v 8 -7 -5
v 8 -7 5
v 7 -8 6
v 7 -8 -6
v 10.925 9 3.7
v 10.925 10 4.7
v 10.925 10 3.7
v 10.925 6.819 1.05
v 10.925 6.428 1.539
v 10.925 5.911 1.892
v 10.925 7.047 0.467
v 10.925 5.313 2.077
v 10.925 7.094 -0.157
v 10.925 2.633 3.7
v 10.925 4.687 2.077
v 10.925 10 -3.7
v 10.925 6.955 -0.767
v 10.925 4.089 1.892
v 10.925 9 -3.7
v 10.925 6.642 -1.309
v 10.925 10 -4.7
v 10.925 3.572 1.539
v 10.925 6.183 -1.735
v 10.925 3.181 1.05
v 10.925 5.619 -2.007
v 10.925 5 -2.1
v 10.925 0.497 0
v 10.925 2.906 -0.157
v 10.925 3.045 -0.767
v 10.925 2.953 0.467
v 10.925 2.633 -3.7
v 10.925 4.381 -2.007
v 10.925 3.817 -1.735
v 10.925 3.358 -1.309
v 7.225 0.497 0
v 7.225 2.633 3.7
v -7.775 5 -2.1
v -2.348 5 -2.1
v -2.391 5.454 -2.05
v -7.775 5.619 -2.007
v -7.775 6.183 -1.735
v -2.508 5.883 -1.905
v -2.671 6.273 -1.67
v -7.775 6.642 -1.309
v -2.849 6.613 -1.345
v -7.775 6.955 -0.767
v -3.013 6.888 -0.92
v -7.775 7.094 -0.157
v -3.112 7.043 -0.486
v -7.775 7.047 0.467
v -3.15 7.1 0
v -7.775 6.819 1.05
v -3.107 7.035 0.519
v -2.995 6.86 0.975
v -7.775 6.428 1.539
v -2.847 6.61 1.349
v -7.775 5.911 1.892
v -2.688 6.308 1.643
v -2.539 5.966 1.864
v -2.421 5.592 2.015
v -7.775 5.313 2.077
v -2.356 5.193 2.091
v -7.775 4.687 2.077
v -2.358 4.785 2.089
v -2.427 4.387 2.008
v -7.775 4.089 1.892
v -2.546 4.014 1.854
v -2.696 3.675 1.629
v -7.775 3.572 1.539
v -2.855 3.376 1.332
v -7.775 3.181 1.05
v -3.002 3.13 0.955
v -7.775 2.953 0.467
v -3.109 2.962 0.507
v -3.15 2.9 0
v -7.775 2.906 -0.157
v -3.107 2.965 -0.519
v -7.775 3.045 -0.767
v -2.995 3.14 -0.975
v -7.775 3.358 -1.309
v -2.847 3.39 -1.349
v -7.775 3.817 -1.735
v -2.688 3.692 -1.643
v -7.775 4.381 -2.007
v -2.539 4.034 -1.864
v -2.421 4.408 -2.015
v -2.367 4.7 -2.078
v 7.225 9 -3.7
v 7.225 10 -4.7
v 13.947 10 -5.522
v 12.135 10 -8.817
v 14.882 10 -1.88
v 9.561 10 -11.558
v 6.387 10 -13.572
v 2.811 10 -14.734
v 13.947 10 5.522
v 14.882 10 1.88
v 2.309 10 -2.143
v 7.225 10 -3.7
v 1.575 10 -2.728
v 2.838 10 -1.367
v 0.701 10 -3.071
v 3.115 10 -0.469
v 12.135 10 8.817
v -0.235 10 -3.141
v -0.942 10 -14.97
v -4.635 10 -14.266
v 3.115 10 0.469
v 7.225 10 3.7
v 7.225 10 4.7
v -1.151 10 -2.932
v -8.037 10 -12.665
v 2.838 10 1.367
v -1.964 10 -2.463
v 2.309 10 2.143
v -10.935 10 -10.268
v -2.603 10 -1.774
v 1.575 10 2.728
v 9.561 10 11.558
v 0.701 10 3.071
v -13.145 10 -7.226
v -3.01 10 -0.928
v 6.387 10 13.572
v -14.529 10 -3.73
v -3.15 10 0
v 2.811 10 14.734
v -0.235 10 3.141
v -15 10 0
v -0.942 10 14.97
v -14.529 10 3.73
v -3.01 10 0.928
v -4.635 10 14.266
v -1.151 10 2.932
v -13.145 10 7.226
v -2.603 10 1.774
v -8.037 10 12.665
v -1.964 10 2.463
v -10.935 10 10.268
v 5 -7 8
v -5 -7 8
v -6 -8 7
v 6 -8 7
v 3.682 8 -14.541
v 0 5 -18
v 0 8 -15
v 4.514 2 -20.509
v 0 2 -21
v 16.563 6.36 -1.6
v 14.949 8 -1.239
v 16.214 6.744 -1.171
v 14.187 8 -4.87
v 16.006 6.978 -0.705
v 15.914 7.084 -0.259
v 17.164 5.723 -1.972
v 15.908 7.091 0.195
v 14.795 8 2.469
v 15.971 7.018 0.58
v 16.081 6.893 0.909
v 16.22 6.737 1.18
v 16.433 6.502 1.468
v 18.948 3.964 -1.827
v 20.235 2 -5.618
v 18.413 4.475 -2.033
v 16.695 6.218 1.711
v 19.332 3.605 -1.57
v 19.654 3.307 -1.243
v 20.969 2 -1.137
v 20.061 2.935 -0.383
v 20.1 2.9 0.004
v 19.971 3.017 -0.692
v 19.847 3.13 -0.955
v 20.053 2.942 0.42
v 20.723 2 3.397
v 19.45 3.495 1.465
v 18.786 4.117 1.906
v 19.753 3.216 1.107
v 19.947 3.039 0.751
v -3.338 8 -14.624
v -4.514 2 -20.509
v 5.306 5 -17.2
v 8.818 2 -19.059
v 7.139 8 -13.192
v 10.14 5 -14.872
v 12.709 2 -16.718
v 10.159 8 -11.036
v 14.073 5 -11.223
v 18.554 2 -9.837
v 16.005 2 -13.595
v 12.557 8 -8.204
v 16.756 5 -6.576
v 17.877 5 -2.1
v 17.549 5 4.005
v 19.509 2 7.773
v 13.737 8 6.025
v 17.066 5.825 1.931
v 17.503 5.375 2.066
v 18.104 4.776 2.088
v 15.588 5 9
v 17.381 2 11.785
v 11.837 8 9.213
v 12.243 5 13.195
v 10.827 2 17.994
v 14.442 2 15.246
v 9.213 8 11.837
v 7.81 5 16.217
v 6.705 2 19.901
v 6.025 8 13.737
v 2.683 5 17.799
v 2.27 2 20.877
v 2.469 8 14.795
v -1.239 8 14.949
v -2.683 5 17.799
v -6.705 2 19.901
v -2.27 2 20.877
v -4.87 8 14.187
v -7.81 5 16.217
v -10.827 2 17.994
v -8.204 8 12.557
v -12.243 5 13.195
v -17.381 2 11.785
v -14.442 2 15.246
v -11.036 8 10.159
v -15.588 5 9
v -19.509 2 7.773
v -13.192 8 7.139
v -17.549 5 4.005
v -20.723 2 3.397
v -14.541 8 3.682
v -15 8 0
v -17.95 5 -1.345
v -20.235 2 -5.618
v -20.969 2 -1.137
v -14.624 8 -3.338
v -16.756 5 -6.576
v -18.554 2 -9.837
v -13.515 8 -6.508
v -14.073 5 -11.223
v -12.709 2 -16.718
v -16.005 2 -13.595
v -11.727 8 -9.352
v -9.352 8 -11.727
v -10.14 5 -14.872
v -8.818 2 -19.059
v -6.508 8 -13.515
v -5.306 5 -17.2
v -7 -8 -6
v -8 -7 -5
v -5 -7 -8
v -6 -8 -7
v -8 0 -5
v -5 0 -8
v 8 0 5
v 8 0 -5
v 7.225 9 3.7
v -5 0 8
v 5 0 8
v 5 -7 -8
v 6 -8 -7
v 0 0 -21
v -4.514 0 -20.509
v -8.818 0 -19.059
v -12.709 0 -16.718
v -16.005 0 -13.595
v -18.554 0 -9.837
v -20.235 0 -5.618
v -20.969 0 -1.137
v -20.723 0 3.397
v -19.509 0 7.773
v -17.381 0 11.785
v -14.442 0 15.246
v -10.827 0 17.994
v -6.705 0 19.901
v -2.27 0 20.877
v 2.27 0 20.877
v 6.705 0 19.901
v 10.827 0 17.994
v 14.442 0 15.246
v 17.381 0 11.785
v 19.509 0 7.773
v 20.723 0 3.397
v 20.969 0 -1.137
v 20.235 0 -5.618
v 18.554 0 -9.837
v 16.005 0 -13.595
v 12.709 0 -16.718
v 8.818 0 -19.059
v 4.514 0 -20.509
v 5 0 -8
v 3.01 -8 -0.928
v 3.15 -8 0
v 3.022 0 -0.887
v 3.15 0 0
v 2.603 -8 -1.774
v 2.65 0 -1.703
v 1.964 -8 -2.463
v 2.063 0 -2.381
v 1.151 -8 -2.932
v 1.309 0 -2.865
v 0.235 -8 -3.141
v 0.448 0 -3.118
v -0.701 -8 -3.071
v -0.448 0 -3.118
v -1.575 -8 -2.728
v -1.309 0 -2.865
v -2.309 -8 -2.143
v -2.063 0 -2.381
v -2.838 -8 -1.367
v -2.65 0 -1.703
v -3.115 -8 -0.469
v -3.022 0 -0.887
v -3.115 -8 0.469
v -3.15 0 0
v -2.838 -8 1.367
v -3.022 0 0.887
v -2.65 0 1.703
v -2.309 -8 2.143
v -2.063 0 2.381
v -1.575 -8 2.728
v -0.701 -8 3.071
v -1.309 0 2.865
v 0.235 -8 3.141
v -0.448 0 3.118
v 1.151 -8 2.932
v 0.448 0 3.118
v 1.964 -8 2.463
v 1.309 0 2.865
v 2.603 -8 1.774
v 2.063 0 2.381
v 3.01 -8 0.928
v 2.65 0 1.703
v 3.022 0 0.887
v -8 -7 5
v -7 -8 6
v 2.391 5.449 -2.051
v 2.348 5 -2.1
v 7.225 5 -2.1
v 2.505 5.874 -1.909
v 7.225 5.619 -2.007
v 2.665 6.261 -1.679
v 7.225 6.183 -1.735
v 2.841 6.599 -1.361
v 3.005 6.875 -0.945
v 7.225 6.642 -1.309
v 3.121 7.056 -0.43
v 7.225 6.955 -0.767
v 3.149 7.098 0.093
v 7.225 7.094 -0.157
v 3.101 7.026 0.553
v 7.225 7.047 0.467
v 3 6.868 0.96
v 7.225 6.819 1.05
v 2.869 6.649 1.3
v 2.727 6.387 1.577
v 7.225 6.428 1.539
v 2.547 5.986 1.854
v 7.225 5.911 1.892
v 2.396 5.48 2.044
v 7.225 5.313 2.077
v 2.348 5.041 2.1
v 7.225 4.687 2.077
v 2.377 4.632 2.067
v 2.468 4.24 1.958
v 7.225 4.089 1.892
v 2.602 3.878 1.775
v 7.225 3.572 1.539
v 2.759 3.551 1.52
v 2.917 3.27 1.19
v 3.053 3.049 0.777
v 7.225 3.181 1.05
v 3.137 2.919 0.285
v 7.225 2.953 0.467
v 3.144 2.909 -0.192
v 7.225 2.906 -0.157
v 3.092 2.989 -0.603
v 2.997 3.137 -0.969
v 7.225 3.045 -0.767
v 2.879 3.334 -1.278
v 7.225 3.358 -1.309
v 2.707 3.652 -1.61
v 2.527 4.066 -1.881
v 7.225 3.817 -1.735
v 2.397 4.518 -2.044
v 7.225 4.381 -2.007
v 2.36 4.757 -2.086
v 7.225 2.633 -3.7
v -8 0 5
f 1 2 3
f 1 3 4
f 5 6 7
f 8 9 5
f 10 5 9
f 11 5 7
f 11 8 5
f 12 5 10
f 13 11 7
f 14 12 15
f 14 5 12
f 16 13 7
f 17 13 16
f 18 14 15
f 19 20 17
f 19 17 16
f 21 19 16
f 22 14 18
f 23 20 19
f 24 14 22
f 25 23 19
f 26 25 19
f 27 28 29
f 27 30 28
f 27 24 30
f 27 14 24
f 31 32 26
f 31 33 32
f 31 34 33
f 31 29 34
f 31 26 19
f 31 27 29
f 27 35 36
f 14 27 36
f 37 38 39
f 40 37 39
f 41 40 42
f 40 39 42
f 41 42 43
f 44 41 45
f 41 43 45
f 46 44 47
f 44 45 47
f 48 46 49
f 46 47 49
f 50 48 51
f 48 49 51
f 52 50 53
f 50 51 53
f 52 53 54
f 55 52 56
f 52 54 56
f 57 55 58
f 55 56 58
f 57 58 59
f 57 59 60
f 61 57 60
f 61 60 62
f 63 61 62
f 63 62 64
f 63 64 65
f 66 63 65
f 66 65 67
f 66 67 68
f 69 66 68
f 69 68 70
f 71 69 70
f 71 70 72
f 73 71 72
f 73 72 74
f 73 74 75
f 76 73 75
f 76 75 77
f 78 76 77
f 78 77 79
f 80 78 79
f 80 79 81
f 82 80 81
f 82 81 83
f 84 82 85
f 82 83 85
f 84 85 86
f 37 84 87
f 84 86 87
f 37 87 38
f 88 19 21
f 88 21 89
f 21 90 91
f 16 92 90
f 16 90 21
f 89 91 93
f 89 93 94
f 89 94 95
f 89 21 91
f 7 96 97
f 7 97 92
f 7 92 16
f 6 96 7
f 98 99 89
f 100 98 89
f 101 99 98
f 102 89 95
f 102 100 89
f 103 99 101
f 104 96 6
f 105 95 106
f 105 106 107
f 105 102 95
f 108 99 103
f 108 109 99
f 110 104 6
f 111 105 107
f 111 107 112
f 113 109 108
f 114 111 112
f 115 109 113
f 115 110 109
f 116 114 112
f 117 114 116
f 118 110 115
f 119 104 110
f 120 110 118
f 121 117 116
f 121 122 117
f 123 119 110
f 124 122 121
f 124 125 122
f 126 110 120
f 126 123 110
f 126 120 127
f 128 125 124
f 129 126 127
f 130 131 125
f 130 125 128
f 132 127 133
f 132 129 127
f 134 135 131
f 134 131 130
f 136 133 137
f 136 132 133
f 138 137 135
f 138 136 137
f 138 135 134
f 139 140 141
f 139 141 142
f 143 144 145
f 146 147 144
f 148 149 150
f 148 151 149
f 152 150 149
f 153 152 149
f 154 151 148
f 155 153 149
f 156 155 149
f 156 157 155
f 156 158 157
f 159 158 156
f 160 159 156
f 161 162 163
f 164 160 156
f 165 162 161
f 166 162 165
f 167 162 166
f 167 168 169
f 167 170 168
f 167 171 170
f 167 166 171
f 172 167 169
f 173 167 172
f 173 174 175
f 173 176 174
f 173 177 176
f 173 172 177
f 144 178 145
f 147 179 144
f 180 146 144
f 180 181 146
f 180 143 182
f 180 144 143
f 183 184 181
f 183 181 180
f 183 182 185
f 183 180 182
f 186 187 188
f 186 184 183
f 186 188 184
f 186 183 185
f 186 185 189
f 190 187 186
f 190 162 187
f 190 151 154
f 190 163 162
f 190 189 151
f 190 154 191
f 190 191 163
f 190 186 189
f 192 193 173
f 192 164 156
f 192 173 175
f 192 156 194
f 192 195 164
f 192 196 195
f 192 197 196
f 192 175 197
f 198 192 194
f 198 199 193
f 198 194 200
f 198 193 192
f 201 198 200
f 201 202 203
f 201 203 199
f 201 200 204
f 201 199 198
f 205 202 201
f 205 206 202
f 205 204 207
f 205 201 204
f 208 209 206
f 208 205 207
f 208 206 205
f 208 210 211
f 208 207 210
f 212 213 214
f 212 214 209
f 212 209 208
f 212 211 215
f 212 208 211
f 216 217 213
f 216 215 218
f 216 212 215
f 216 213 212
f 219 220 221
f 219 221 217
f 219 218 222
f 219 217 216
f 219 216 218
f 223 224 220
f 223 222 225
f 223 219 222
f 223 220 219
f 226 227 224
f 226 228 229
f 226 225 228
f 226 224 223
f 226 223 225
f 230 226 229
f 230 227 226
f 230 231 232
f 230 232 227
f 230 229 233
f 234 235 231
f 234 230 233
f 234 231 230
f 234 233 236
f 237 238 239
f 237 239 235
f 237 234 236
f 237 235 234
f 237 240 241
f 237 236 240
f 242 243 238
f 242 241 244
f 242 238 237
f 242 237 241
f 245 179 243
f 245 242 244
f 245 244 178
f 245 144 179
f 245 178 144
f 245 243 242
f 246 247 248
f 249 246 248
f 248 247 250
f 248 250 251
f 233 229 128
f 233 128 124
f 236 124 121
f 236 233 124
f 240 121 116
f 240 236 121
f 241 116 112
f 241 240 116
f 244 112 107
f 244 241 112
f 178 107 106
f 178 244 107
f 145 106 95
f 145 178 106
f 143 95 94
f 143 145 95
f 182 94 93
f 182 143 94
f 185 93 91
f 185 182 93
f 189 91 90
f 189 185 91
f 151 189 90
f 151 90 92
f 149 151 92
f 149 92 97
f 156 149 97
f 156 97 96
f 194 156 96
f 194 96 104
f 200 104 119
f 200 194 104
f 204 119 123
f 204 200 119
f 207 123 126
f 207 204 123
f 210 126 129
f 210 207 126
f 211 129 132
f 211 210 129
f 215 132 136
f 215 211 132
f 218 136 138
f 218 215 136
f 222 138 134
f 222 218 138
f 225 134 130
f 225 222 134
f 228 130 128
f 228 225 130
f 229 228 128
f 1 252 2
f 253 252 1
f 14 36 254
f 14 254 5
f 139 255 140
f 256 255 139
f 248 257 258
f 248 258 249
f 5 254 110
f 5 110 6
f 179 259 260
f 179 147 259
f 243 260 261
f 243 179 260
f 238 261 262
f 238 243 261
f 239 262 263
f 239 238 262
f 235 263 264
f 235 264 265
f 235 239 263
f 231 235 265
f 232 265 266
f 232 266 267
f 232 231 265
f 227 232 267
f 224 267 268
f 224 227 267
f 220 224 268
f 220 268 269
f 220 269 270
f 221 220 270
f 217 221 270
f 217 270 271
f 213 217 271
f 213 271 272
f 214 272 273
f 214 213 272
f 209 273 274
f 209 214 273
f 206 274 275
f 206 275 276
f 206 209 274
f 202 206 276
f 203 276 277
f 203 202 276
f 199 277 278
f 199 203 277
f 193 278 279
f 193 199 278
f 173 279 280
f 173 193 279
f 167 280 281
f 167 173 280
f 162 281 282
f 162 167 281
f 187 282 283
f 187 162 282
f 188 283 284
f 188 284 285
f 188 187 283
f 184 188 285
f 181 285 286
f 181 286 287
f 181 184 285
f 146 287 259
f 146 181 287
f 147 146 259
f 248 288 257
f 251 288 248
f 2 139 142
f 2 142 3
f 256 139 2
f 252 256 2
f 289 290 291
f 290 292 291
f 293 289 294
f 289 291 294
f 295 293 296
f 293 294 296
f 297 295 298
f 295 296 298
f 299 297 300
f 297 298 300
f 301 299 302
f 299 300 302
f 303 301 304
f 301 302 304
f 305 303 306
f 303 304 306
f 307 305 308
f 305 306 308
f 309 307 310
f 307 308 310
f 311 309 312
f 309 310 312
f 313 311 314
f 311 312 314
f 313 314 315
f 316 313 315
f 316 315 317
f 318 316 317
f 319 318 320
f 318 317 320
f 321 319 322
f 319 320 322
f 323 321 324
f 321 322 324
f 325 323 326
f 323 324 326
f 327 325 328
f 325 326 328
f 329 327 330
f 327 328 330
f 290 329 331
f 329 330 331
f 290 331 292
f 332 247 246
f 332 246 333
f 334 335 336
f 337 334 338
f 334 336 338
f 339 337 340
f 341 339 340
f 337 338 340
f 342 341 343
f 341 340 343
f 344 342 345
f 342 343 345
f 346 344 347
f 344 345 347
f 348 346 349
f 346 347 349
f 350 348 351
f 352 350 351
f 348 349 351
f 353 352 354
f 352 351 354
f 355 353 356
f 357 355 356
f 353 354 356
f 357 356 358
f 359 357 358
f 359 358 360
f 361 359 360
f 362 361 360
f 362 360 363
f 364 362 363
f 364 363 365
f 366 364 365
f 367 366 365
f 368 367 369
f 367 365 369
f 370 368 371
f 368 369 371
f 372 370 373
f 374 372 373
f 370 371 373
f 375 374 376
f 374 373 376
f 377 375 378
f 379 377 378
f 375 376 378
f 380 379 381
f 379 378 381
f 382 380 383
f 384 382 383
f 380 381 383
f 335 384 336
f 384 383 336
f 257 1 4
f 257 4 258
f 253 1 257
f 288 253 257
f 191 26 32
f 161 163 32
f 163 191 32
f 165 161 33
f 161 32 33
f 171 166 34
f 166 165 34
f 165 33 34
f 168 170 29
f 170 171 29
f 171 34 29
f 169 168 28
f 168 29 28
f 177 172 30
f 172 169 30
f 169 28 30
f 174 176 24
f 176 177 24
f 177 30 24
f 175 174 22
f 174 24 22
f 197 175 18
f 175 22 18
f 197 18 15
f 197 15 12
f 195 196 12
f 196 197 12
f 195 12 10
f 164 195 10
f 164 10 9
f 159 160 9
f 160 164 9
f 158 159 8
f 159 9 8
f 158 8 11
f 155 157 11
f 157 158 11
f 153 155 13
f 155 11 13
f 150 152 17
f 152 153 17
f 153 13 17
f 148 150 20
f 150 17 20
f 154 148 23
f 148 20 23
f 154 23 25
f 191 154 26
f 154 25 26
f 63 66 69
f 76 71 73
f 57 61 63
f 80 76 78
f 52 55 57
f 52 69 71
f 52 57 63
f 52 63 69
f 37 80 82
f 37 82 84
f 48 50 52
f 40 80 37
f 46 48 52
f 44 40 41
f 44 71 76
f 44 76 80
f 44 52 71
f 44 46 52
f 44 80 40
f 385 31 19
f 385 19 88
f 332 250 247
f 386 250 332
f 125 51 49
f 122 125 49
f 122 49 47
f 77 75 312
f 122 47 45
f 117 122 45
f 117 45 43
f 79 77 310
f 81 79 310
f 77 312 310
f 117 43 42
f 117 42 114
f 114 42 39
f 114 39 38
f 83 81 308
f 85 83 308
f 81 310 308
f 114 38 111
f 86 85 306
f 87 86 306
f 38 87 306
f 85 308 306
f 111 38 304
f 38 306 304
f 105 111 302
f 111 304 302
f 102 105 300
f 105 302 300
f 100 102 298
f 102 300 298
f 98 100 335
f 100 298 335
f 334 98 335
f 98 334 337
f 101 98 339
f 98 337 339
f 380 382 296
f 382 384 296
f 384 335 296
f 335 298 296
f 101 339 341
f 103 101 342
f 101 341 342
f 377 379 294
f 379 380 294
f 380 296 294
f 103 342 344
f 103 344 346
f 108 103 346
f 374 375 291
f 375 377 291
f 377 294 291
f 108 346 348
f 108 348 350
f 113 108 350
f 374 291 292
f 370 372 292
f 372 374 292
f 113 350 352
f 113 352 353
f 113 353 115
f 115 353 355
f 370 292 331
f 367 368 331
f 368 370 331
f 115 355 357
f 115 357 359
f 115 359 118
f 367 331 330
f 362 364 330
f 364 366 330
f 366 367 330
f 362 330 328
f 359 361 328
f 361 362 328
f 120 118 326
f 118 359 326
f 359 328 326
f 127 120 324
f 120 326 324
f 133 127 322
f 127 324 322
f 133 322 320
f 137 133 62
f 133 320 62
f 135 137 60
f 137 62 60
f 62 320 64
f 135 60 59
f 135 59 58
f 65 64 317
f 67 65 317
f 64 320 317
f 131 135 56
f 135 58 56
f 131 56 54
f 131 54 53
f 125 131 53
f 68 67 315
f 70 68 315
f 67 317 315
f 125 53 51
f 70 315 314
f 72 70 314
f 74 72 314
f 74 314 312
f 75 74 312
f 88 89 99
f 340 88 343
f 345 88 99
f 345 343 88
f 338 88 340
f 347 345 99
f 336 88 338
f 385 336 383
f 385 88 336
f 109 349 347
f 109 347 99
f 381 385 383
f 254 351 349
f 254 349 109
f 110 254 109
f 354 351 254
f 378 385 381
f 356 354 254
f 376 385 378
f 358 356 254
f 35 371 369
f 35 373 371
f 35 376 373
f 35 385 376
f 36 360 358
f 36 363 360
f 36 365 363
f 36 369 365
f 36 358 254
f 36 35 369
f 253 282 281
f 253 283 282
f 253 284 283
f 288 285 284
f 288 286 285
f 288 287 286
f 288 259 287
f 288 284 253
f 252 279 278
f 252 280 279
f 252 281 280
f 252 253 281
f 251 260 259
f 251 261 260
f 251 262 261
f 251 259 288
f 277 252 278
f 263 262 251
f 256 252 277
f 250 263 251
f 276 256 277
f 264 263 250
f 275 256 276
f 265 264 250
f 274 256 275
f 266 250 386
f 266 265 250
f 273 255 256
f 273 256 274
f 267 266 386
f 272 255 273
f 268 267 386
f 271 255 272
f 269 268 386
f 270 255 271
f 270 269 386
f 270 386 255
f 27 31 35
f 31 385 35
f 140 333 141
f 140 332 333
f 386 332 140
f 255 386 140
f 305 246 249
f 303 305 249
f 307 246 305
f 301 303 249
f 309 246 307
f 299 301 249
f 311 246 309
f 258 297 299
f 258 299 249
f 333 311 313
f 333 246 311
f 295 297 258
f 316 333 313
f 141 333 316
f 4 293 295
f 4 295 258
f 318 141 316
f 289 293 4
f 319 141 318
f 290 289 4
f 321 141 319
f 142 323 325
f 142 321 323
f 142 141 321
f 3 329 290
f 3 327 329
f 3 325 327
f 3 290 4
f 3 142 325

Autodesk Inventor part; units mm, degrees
ref_plane "YZ Plane" through (0, 0, 0) normal (1, 0, 0) x (0, 1, 0)
ref_plane "XZ Plane" through (0, 0, 0) normal (0, 1, 0) x (-1, 0, 0)
ref_plane "XY Plane" through (0, 0, 0) normal (0, 0, 1) x (1, 0, 0)
sketch "Boceto1" plane through (0, 0, 0) normal (0, 1, 0) x (-1, 0, 0)
  circle A0 centre (0, 0) radius 3.15
  circle A1 centre (0, 0) radius 15
  line L0 (-7.225, 3.7) -> (-10.925, 3.7)
  line L1 (-10.925, 3.7) -> (-10.925, -3.7)
  line L2 (-10.925, -3.7) -> (-7.225, -3.7)
  line L3 (-7.225, -3.7) -> (-7.225, 3.7)
  circle A2 centre (0, 0) radius 9.8003 construction
  line L4 (6.8168, -4.407) -> (0.4082, -8.107)
  line L5 (8.6668, -7.6113) -> (6.8168, -4.407)
  line L6 (2.2582, -11.3113) -> (8.6668, -7.6113)
  line L7 (0.4082, -8.107) -> (2.2582, -11.3113)
  line L8 (0.4082, 8.107) -> (6.8168, 4.407)
  line L9 (2.2582, 11.3113) -> (0.4082, 8.107)
  line L10 (8.6668, 7.6113) -> (2.2582, 11.3113)
  line L11 (6.8168, 4.407) -> (8.6668, 7.6113)
  point P0 (-7.225, 0)
  point P1 (-9.075, 3.7)
  point P2 (3.6125, -6.257)
  point P3 (1.3332, -9.7092)
  point P4 (3.6125, 6.257)
  point P5 (7.7418, 6.0092)
  dimension "d0" = 6.3
  dimension "tuerca" = 7.4
  dimension "d2" = 11.85
  dimension "d3" = 6.6503
  dimension "d4" = 3.7
  dimension "d18" = 360
  dimension "d26" = 30
  dimension "d27" = 4.075
  dimension "d28" = 4.075
extrude "Extrusión1" add sketch "Boceto1" along normal blind 10 contours A1 | L5 L6 L7 L4 | L9 L10 L11 L8
sketch "Boceto4" plane through (0, 0, 0) normal (1, 0, 0) x (0, 1, 0)
  line L0 (0, -15) -> (10, -15) projected
  line L1 (0, -15) -> (0, -21)
  line L2 (0, -21) -> (2, -21)
  line L3 (2, -21) -> (8, -15)
  line L4 (0, 0) -> (7.4976, 0)
  dimension "d47" = 45
  dimension "d48" = 21
  dimension "d49" = 2
revolve "Revolución1" add sketch "Boceto4" angle 360 about axis through (0, 0, 0) along (0, 1, 0)
sketch "Boceto2" plane through (7.225, 0, -3.7) normal (1, 0, 0) x (0, 0, -1)
  line L0 (0, 0) -> (-7.4, 0) projected
  line L1 (0, 0) -> (0, 10) construction
  line L2 (-7.4, 10) -> (0, 10) construction
  line L3 (-7.4, 0) -> (-7.4, 10) construction
  line L4 (-7.4, 0) -> (0, 10) construction
  circle A0 centre (-3.7, 5) radius 2.1
  line L5 (0, 2.6329) -> (-4.5603, 0)
  line L6 (-2.8397, 0) -> (-7.4, 2.6329)
  line L7 (-7.4, 2.6329) -> (-7.4, 0)
  line L8 (0, 2.6329) -> (0, 0)
  point P0 (-3.7, 0)
  dimension "d7" = 4.2
  dimension "d8" = 120
  dimension "d9" = 3.9
extrude "Extrusión2" cut sketch "Boceto2" along normal mid plane 30 contours A0
extrude "Extrusión3" add sketch "Boceto2" along normal up to next contours L0 L6 L5 L8 | L0 L5 L6 | L0 L7 L6 L5
sketch "Boceto3" plane through (0, 0, 0) normal (0, -1, 0) x (1, 0, 0)
  circle A0 centre (0, 0) radius 3.15 projected
  circle A1 centre (0, 0) radius 27.5
  line L0 (-5, 8) -> (5, 8)
  line L1 (8, 5) -> (8, -5)
  line L2 (5, -8) -> (-5, -8)
  line L3 (-8, -5) -> (-8, 5)
  line L4 (-8, 5) -> (-5, 8)
  line L5 (5, 8) -> (8, 5)
  line L6 (8, -5) -> (5, -8)
  line L7 (-8, -5) -> (-5, -8)
  point P0 (-8, 8)
  point P1 (8, -8)
  point P2 (8, 8)
  point P3 (-8, -8)
  point P4 (-8, 0)
  point P5 (0, -8)
  dimension "d32" = 16
  dimension "d33" = 55
  dimension "d39" = 3
  dimension "d40" = 3
  dimension "d41" = 3
  dimension "d42" = 3
  dimension "d43" = 3
  dimension "d44" = 3
  dimension "d45" = 3
  dimension "d46" = 3
extrude "Extrusión4" add sketch "Boceto3" along normal blind 8 contours L0 L5 L1 L6 L2 L7 L3 L4
chamfer "Chaflán1" distance 1 angle 45 2 edges at (9.075, 10, 3.7) (9.075, 10, -3.7)
chamfer "Chaflán3" distance 1 angle 45 4 edges at (0, -8, 8) (-8, -8, 0) (0, -8, -8) (8, -8, 0)
equation "\"d28\" = d27"
equation "\"d40\" = d39"
equation "\"d41\" = d39"
equation "\"d42\" = d41"
equation "\"d43\" = d39"
equation "\"d44\" = d43"
equation "\"d45\" = d39"
equation "\"d46\" = d45"
properties part number "dado polea correa motor"
